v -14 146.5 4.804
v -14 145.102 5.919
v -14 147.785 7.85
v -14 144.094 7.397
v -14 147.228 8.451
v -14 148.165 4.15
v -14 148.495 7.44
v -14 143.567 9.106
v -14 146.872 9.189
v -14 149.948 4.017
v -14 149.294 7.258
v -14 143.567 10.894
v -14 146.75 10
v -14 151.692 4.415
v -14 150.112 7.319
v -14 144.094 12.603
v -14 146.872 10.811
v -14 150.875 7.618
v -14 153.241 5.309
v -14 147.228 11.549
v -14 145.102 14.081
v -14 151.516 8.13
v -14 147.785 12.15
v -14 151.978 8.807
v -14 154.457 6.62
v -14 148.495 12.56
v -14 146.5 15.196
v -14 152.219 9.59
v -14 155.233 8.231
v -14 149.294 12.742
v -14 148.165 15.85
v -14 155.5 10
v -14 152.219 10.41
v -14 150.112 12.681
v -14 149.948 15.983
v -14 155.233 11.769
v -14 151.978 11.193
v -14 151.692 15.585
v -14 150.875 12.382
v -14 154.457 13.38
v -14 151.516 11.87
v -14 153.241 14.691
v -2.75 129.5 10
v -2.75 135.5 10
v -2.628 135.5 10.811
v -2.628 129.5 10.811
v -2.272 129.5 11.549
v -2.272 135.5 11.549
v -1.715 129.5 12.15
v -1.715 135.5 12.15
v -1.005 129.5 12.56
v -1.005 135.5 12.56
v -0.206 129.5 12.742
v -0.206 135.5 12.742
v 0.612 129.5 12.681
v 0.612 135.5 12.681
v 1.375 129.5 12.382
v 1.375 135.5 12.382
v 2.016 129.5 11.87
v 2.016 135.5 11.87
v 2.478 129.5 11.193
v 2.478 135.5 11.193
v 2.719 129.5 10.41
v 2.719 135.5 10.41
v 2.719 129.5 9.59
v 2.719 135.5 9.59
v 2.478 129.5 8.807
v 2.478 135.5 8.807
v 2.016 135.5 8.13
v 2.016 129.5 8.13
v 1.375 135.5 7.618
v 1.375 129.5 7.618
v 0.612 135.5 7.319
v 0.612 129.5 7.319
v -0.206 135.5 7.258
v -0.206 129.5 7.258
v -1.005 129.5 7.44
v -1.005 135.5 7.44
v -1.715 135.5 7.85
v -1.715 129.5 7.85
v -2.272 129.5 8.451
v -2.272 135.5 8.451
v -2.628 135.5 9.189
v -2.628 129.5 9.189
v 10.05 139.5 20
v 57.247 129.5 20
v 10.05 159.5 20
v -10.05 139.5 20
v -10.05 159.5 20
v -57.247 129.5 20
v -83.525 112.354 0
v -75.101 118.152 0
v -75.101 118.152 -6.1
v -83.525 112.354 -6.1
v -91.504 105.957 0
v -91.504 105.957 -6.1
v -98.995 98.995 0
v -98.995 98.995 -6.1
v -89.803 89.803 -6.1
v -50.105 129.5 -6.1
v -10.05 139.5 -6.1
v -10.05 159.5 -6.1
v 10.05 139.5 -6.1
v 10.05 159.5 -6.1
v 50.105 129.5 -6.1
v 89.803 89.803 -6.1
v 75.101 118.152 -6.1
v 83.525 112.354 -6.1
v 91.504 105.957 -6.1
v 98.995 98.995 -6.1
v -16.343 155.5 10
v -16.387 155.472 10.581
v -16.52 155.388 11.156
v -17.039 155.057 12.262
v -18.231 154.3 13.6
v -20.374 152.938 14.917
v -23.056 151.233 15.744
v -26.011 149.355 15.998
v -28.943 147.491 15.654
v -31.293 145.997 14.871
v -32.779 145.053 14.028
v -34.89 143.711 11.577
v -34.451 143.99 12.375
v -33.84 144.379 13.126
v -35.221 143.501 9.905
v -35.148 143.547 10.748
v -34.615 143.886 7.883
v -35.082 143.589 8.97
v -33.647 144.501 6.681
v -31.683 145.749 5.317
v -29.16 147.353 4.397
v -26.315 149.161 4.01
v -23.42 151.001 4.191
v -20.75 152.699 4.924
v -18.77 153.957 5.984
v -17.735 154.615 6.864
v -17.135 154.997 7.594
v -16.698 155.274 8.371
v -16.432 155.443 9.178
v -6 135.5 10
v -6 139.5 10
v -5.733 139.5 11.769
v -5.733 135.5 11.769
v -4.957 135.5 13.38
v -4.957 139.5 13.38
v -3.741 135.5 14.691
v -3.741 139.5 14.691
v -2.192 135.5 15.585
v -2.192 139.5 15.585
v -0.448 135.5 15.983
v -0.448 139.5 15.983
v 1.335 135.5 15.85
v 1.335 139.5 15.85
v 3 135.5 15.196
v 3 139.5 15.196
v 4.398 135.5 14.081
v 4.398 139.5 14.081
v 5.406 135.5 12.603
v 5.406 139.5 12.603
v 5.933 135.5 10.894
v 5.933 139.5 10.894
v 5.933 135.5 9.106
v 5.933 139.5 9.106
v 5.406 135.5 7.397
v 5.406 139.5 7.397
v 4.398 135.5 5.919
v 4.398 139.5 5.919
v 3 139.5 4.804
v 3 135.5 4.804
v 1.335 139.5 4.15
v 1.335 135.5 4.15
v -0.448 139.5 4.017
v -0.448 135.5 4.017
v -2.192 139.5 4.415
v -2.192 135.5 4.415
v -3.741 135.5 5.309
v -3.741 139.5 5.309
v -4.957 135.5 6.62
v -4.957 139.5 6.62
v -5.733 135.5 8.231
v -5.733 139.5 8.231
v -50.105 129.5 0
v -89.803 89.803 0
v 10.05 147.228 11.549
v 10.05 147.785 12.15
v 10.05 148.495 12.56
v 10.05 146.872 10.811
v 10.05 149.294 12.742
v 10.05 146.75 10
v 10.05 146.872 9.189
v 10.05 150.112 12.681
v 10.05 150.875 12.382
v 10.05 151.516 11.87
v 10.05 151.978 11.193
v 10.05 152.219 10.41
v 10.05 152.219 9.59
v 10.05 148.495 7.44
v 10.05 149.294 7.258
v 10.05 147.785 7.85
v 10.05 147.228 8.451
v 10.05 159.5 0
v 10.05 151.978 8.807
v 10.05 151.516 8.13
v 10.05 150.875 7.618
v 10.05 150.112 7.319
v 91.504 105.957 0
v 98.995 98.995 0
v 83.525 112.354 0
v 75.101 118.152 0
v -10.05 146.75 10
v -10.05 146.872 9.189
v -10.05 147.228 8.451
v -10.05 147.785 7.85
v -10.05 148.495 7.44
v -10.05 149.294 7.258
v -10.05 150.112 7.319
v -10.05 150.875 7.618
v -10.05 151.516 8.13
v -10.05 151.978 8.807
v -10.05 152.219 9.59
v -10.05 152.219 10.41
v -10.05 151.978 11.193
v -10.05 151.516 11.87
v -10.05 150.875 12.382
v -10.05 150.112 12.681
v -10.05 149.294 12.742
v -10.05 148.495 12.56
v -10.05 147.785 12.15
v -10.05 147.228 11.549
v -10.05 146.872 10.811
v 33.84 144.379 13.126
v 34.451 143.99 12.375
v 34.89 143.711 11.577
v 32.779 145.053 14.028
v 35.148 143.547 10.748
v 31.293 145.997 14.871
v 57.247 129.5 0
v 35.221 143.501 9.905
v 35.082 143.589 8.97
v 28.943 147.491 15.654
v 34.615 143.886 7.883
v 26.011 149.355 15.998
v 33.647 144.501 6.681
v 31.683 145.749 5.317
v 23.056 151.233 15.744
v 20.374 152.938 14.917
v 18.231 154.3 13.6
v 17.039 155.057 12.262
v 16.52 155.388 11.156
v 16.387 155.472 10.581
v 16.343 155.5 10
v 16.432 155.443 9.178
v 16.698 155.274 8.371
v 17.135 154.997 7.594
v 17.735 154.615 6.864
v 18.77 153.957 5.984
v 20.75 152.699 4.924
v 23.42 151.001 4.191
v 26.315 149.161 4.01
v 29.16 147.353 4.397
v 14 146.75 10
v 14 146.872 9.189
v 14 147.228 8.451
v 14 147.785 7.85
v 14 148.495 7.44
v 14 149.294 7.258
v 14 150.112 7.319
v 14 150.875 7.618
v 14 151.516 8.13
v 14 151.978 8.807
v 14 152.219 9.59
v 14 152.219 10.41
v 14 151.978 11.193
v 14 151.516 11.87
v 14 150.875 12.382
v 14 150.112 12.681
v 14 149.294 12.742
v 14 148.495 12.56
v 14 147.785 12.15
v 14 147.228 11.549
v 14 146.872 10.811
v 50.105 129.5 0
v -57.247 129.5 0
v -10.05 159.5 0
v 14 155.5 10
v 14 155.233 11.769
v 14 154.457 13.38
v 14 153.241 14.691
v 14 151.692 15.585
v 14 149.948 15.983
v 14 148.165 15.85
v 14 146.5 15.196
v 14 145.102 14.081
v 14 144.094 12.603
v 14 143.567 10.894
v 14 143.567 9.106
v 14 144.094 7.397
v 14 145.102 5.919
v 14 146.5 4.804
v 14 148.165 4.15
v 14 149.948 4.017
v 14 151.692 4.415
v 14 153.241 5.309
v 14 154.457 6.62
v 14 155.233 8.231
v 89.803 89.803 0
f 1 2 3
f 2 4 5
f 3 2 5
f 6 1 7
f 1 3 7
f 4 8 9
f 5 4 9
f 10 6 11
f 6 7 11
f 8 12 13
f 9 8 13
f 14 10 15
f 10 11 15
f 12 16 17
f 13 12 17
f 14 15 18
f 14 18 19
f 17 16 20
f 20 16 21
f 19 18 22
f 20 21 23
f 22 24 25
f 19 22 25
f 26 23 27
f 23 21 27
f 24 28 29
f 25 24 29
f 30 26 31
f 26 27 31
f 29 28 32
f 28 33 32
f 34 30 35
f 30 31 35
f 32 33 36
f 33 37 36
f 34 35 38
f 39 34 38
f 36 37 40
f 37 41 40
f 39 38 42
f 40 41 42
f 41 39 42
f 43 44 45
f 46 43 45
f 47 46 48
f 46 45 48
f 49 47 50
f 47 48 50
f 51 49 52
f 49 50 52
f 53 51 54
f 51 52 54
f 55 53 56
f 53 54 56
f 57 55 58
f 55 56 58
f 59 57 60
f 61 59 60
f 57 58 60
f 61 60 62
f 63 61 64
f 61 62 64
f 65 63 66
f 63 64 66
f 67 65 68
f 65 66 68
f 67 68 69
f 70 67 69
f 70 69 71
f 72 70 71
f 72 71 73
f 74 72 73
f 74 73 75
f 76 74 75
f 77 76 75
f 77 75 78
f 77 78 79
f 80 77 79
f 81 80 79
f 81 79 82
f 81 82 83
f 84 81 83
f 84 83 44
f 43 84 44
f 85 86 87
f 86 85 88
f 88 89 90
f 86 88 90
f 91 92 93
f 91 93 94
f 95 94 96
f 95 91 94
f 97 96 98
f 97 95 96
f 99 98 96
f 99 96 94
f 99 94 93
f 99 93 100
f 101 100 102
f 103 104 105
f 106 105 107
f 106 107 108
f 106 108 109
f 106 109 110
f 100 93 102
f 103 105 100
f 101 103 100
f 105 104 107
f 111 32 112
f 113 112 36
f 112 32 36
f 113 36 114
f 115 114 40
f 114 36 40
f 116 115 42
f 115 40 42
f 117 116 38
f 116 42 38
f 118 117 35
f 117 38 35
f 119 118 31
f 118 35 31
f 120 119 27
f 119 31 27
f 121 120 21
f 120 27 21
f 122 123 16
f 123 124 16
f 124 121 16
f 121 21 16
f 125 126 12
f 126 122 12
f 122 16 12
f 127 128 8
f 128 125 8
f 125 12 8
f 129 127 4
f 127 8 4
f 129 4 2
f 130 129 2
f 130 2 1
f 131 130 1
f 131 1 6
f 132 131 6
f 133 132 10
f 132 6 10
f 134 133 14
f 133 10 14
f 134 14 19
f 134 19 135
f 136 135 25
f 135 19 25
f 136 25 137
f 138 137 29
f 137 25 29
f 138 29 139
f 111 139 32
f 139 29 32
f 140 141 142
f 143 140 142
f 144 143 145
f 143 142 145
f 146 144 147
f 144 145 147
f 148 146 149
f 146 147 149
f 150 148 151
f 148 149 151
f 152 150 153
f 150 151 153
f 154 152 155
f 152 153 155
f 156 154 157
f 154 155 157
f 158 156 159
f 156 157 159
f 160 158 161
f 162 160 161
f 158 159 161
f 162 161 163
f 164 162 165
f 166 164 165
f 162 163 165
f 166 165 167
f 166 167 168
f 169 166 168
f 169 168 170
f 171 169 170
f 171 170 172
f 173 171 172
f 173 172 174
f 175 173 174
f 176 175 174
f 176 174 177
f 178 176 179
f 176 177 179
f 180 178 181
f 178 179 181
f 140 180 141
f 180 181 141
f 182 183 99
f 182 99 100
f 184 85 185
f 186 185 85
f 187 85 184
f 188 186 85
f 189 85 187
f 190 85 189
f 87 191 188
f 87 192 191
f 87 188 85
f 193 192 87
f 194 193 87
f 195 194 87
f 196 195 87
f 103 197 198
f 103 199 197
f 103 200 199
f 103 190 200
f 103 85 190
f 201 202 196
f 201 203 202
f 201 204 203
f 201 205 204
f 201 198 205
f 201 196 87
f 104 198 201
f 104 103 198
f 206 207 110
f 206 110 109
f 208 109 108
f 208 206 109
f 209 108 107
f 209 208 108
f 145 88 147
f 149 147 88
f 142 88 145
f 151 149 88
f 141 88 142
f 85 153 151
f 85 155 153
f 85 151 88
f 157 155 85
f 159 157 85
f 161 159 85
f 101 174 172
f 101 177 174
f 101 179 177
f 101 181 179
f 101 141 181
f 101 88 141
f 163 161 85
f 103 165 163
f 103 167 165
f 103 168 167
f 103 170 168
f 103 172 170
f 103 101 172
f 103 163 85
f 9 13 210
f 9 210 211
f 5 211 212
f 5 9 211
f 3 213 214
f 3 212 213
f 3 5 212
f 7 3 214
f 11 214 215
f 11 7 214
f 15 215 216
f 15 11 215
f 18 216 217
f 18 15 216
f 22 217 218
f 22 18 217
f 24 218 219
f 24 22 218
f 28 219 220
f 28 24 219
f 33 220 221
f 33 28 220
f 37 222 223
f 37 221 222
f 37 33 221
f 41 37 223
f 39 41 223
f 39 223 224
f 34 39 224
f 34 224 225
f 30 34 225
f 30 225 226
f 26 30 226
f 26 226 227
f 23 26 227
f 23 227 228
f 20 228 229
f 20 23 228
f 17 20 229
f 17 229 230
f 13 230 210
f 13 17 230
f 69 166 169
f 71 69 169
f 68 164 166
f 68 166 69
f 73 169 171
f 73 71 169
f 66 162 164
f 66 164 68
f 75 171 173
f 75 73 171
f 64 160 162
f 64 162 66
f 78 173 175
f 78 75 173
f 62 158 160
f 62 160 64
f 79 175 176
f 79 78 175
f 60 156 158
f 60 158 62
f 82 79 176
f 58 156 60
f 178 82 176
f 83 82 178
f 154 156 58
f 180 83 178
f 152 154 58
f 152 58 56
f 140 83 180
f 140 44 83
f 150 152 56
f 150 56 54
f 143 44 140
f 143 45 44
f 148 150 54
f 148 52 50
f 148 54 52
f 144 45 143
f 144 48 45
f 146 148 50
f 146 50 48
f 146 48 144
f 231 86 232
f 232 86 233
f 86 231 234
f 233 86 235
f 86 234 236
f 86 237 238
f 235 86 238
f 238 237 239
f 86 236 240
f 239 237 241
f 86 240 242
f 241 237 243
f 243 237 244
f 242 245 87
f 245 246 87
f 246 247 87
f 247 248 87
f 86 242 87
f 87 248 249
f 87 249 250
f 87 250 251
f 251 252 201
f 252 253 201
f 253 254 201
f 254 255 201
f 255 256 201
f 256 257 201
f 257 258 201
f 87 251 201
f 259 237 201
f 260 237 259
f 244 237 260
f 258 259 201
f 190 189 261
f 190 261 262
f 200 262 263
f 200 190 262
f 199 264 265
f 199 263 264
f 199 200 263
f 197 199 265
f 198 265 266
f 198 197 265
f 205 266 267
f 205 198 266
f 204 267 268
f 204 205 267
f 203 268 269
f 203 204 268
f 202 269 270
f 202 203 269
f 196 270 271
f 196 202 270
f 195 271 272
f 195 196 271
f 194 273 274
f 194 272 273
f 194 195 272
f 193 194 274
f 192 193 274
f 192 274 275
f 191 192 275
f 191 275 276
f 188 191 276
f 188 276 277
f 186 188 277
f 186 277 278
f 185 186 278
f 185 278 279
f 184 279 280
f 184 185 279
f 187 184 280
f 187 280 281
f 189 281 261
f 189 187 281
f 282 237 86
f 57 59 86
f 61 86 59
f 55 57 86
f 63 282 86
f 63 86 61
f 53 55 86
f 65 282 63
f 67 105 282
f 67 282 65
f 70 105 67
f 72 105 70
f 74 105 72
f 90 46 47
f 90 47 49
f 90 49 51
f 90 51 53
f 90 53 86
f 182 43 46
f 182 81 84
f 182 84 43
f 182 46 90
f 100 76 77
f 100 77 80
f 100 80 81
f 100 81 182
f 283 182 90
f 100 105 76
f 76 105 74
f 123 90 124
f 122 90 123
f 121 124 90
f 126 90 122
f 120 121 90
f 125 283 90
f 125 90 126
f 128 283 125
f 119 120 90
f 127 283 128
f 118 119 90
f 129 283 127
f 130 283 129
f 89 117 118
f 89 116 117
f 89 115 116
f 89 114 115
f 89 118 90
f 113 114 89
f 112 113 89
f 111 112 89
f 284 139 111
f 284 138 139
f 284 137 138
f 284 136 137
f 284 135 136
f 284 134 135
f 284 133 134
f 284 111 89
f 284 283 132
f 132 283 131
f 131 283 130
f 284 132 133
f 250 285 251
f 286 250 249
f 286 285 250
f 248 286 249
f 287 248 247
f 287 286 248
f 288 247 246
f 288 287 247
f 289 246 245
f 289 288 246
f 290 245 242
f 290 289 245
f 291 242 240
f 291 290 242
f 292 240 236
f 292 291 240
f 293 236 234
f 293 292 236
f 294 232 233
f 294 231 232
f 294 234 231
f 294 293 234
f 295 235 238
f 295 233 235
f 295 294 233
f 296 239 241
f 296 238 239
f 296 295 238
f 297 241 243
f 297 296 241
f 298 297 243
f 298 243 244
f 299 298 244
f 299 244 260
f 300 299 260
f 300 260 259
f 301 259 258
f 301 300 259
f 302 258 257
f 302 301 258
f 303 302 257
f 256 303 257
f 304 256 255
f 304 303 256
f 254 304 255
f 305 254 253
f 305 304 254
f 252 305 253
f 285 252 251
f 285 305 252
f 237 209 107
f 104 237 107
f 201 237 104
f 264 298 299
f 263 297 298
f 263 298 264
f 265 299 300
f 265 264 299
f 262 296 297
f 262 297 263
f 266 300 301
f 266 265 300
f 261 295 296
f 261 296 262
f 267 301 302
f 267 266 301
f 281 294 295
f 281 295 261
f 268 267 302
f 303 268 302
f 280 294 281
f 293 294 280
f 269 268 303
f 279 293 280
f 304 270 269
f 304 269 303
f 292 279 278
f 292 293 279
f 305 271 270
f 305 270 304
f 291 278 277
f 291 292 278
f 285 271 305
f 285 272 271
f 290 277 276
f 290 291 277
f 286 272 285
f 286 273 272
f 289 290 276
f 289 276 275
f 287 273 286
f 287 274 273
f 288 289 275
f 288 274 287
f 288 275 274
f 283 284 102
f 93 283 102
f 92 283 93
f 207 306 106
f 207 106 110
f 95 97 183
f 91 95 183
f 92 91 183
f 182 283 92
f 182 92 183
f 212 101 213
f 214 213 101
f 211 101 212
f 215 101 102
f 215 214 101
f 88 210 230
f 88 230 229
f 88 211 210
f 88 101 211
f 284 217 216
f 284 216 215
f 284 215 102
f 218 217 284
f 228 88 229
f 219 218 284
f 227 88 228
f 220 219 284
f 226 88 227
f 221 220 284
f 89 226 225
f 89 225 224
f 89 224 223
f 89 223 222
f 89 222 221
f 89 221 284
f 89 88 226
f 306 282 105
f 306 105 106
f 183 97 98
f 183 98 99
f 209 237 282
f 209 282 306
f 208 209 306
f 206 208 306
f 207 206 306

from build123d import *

# Parameters (mm, degrees)
BOSS_EXTRUDE4_DEPTH     = 6.1
BOSS_EXTRUDE5_DEPTH     = 20
BOSS_EXTRUDE6_DEPTH     = 6.1
BOSS_EXTRUDE7_DEPTH     = 20
CUT_EXTRUDE1_DEPTH      = 189.786254796
CUT_EXTRUDE1_DEPTH_BACK = 189.786254796
SKETCH9_W               = 20.1
SKETCH9_H               = 10
SKETCH10_R              = 2.75
CUT_EXTRUDE2_DEPTH      = 20
SKETCH11_R              = 6
CUT_EXTRUDE3_DEPTH      = 4
CUT_EXTRUDE4_DEPTH      = 189.786254796
CUT_EXTRUDE4_DEPTH_BACK = 189.786254796
SKETCH12_R              = 2.75
SKETCH13_R              = 6
CUT_EXTRUDE5_DEPTH      = 197.489461759
SKETCH14_R              = 6
CUT_EXTRUDE6_DEPTH      = 197.489461759


with BuildPart() as part:
    # Sketch5 → Boss-Extrude4 (new body)
    with BuildSketch(Plane.XY):
        with BuildLine():
            Line((-89.802561211, 89.802561211), (-50.105122421, 129.5))
            Line((-50.105122421, 129.5), (50.105122421, 129.5))
            Line((50.105122421, 129.5), (89.802561211, 89.802561211))
            Line((89.802561211, 89.802561211), (98.994949366, 98.994949366))
            ThreePointArc((98.994949366, 98.994949366), (0, 140), (-98.994949366, 98.994949366))
            Line((-98.994949366, 98.994949366), (-89.802561211, 89.802561211))
        make_face()
    extrude(amount=-BOSS_EXTRUDE4_DEPTH)

    # Sketch6 → Boss-Extrude5 (add)
    with BuildSketch(Plane.XY):
        Polygon((10.05, 139.5), (-10.05, 139.5), (-10.05, 159.5), (-50.105122421, 130.726725298), (-50.105122421, 129.5), (50.105122421, 129.5), (50.105122421, 130.726725298), (10.05, 159.5), align=None)
    extrude(amount=BOSS_EXTRUDE5_DEPTH)

    # Sketch7 → Boss-Extrude6 (add)
    with BuildSketch(Plane.XY):
        with BuildLine():
            Line((-10.05, 159.5), (-75.100690367, 118.15196277))
            ThreePointArc((-75.100690367, 118.15196277), (-87.573230694, 109.228793209), (-98.994949366, 98.994949366))
            Line((-98.994949366, 98.994949366), (-89.802561211, 89.802561211))
            Line((-89.802561211, 89.802561211), (-50.105122421, 129.5))
            Line((-50.105122421, 129.5), (50.105122421, 129.5))
            Line((50.105122421, 129.5), (89.802561211, 89.802561211))
            Line((89.802561211, 89.802561211), (98.994949366, 98.994949366))
            ThreePointArc((98.994949366, 98.994949366), (87.573230694, 109.228793209), (75.100690367, 118.15196277))
            Line((75.100690367, 118.15196277), (10.05, 159.5))
            Line((10.05, 159.5), (10.05, 139.5))
            Line((10.05, 139.5), (-10.05, 139.5))
            Line((-10.05, 139.5), (-10.05, 159.5))
        make_face()
    extrude(amount=-BOSS_EXTRUDE6_DEPTH)

    # Sketch8 → Boss-Extrude7 (add)
    with BuildSketch(Plane.XY):
        Polygon((-50.105122421, 130.726725298), (-50.105122421, 129.5), (-57.247420766, 129.5), (-10.05, 159.5), align=None)
        Polygon((50.105122421, 129.5), (57.247420766, 129.5), (10.05, 159.5), (50.105122421, 130.726725298), align=None)
    extrude(amount=BOSS_EXTRUDE7_DEPTH)

    # Sketch9 → Cut-Extrude1 (cut, two sides: drawn at the far end of the back side and taken through both)
    with BuildSketch(Plane.XY.offset(-CUT_EXTRUDE1_DEPTH_BACK)):
        with Locations((0, 144.5)):
            Rectangle(SKETCH9_W, SKETCH9_H)
    extrude(amount=CUT_EXTRUDE1_DEPTH + CUT_EXTRUDE1_DEPTH_BACK, mode=Mode.SUBTRACT)

    # Sketch10 → Cut-Extrude2 (cut)
    with BuildSketch(Plane(origin=(0, 139.5, 0), x_dir=(1, 0, 0), z_dir=(0, 1, 0))):
        with Locations(Location((0, -10, 0), (0, 0, 180))):
            Circle(SKETCH10_R)
    extrude(amount=-CUT_EXTRUDE2_DEPTH, mode=Mode.SUBTRACT)

    # Sketch11 → Cut-Extrude3 (cut)
    with BuildSketch(Plane(origin=(0, 139.5, 0), x_dir=(1, 0, 0), z_dir=(0, 1, 0))):
        with Locations(Location((0, -10, 0), (0, 0, 180))):
            Circle(SKETCH11_R)
    extrude(amount=-CUT_EXTRUDE3_DEPTH, mode=Mode.SUBTRACT)

    # Sketch12 → Cut-Extrude4 (cut, two sides: drawn at the far end of the back side and taken through both)
    with BuildSketch(Plane(origin=(0, 0, 0), x_dir=(0, 0, -1), z_dir=(1, 0, 0)).offset(-CUT_EXTRUDE4_DEPTH_BACK)):
        with Locations(Location((-10, 149.5, 0), (0, 0, 270))):
            Circle(SKETCH12_R)
    extrude(amount=CUT_EXTRUDE4_DEPTH + CUT_EXTRUDE4_DEPTH_BACK, mode=Mode.SUBTRACT)

    # Sketch13 → Cut-Extrude5 (cut, through all)
    with BuildSketch(Plane(origin=(14, 0, 0), x_dir=(0, 0, -1), z_dir=(1, 0, 0))):
        with Locations(Location((-10, 149.5, 0), (0, 0, 90))):
            Circle(SKETCH13_R)
    extrude(amount=CUT_EXTRUDE5_DEPTH, mode=Mode.SUBTRACT)

    # Sketch14 → Cut-Extrude6 (cut, through all)
    with BuildSketch(Plane(origin=(-14, 0, 0), x_dir=(0, 0, -1), z_dir=(1, 0, 0))):
        with Locations(Location((-10, 149.5, 0), (0, 0, 90))):
            Circle(SKETCH14_R)
    extrude(amount=-CUT_EXTRUDE6_DEPTH, mode=Mode.SUBTRACT)


solid = part.part
